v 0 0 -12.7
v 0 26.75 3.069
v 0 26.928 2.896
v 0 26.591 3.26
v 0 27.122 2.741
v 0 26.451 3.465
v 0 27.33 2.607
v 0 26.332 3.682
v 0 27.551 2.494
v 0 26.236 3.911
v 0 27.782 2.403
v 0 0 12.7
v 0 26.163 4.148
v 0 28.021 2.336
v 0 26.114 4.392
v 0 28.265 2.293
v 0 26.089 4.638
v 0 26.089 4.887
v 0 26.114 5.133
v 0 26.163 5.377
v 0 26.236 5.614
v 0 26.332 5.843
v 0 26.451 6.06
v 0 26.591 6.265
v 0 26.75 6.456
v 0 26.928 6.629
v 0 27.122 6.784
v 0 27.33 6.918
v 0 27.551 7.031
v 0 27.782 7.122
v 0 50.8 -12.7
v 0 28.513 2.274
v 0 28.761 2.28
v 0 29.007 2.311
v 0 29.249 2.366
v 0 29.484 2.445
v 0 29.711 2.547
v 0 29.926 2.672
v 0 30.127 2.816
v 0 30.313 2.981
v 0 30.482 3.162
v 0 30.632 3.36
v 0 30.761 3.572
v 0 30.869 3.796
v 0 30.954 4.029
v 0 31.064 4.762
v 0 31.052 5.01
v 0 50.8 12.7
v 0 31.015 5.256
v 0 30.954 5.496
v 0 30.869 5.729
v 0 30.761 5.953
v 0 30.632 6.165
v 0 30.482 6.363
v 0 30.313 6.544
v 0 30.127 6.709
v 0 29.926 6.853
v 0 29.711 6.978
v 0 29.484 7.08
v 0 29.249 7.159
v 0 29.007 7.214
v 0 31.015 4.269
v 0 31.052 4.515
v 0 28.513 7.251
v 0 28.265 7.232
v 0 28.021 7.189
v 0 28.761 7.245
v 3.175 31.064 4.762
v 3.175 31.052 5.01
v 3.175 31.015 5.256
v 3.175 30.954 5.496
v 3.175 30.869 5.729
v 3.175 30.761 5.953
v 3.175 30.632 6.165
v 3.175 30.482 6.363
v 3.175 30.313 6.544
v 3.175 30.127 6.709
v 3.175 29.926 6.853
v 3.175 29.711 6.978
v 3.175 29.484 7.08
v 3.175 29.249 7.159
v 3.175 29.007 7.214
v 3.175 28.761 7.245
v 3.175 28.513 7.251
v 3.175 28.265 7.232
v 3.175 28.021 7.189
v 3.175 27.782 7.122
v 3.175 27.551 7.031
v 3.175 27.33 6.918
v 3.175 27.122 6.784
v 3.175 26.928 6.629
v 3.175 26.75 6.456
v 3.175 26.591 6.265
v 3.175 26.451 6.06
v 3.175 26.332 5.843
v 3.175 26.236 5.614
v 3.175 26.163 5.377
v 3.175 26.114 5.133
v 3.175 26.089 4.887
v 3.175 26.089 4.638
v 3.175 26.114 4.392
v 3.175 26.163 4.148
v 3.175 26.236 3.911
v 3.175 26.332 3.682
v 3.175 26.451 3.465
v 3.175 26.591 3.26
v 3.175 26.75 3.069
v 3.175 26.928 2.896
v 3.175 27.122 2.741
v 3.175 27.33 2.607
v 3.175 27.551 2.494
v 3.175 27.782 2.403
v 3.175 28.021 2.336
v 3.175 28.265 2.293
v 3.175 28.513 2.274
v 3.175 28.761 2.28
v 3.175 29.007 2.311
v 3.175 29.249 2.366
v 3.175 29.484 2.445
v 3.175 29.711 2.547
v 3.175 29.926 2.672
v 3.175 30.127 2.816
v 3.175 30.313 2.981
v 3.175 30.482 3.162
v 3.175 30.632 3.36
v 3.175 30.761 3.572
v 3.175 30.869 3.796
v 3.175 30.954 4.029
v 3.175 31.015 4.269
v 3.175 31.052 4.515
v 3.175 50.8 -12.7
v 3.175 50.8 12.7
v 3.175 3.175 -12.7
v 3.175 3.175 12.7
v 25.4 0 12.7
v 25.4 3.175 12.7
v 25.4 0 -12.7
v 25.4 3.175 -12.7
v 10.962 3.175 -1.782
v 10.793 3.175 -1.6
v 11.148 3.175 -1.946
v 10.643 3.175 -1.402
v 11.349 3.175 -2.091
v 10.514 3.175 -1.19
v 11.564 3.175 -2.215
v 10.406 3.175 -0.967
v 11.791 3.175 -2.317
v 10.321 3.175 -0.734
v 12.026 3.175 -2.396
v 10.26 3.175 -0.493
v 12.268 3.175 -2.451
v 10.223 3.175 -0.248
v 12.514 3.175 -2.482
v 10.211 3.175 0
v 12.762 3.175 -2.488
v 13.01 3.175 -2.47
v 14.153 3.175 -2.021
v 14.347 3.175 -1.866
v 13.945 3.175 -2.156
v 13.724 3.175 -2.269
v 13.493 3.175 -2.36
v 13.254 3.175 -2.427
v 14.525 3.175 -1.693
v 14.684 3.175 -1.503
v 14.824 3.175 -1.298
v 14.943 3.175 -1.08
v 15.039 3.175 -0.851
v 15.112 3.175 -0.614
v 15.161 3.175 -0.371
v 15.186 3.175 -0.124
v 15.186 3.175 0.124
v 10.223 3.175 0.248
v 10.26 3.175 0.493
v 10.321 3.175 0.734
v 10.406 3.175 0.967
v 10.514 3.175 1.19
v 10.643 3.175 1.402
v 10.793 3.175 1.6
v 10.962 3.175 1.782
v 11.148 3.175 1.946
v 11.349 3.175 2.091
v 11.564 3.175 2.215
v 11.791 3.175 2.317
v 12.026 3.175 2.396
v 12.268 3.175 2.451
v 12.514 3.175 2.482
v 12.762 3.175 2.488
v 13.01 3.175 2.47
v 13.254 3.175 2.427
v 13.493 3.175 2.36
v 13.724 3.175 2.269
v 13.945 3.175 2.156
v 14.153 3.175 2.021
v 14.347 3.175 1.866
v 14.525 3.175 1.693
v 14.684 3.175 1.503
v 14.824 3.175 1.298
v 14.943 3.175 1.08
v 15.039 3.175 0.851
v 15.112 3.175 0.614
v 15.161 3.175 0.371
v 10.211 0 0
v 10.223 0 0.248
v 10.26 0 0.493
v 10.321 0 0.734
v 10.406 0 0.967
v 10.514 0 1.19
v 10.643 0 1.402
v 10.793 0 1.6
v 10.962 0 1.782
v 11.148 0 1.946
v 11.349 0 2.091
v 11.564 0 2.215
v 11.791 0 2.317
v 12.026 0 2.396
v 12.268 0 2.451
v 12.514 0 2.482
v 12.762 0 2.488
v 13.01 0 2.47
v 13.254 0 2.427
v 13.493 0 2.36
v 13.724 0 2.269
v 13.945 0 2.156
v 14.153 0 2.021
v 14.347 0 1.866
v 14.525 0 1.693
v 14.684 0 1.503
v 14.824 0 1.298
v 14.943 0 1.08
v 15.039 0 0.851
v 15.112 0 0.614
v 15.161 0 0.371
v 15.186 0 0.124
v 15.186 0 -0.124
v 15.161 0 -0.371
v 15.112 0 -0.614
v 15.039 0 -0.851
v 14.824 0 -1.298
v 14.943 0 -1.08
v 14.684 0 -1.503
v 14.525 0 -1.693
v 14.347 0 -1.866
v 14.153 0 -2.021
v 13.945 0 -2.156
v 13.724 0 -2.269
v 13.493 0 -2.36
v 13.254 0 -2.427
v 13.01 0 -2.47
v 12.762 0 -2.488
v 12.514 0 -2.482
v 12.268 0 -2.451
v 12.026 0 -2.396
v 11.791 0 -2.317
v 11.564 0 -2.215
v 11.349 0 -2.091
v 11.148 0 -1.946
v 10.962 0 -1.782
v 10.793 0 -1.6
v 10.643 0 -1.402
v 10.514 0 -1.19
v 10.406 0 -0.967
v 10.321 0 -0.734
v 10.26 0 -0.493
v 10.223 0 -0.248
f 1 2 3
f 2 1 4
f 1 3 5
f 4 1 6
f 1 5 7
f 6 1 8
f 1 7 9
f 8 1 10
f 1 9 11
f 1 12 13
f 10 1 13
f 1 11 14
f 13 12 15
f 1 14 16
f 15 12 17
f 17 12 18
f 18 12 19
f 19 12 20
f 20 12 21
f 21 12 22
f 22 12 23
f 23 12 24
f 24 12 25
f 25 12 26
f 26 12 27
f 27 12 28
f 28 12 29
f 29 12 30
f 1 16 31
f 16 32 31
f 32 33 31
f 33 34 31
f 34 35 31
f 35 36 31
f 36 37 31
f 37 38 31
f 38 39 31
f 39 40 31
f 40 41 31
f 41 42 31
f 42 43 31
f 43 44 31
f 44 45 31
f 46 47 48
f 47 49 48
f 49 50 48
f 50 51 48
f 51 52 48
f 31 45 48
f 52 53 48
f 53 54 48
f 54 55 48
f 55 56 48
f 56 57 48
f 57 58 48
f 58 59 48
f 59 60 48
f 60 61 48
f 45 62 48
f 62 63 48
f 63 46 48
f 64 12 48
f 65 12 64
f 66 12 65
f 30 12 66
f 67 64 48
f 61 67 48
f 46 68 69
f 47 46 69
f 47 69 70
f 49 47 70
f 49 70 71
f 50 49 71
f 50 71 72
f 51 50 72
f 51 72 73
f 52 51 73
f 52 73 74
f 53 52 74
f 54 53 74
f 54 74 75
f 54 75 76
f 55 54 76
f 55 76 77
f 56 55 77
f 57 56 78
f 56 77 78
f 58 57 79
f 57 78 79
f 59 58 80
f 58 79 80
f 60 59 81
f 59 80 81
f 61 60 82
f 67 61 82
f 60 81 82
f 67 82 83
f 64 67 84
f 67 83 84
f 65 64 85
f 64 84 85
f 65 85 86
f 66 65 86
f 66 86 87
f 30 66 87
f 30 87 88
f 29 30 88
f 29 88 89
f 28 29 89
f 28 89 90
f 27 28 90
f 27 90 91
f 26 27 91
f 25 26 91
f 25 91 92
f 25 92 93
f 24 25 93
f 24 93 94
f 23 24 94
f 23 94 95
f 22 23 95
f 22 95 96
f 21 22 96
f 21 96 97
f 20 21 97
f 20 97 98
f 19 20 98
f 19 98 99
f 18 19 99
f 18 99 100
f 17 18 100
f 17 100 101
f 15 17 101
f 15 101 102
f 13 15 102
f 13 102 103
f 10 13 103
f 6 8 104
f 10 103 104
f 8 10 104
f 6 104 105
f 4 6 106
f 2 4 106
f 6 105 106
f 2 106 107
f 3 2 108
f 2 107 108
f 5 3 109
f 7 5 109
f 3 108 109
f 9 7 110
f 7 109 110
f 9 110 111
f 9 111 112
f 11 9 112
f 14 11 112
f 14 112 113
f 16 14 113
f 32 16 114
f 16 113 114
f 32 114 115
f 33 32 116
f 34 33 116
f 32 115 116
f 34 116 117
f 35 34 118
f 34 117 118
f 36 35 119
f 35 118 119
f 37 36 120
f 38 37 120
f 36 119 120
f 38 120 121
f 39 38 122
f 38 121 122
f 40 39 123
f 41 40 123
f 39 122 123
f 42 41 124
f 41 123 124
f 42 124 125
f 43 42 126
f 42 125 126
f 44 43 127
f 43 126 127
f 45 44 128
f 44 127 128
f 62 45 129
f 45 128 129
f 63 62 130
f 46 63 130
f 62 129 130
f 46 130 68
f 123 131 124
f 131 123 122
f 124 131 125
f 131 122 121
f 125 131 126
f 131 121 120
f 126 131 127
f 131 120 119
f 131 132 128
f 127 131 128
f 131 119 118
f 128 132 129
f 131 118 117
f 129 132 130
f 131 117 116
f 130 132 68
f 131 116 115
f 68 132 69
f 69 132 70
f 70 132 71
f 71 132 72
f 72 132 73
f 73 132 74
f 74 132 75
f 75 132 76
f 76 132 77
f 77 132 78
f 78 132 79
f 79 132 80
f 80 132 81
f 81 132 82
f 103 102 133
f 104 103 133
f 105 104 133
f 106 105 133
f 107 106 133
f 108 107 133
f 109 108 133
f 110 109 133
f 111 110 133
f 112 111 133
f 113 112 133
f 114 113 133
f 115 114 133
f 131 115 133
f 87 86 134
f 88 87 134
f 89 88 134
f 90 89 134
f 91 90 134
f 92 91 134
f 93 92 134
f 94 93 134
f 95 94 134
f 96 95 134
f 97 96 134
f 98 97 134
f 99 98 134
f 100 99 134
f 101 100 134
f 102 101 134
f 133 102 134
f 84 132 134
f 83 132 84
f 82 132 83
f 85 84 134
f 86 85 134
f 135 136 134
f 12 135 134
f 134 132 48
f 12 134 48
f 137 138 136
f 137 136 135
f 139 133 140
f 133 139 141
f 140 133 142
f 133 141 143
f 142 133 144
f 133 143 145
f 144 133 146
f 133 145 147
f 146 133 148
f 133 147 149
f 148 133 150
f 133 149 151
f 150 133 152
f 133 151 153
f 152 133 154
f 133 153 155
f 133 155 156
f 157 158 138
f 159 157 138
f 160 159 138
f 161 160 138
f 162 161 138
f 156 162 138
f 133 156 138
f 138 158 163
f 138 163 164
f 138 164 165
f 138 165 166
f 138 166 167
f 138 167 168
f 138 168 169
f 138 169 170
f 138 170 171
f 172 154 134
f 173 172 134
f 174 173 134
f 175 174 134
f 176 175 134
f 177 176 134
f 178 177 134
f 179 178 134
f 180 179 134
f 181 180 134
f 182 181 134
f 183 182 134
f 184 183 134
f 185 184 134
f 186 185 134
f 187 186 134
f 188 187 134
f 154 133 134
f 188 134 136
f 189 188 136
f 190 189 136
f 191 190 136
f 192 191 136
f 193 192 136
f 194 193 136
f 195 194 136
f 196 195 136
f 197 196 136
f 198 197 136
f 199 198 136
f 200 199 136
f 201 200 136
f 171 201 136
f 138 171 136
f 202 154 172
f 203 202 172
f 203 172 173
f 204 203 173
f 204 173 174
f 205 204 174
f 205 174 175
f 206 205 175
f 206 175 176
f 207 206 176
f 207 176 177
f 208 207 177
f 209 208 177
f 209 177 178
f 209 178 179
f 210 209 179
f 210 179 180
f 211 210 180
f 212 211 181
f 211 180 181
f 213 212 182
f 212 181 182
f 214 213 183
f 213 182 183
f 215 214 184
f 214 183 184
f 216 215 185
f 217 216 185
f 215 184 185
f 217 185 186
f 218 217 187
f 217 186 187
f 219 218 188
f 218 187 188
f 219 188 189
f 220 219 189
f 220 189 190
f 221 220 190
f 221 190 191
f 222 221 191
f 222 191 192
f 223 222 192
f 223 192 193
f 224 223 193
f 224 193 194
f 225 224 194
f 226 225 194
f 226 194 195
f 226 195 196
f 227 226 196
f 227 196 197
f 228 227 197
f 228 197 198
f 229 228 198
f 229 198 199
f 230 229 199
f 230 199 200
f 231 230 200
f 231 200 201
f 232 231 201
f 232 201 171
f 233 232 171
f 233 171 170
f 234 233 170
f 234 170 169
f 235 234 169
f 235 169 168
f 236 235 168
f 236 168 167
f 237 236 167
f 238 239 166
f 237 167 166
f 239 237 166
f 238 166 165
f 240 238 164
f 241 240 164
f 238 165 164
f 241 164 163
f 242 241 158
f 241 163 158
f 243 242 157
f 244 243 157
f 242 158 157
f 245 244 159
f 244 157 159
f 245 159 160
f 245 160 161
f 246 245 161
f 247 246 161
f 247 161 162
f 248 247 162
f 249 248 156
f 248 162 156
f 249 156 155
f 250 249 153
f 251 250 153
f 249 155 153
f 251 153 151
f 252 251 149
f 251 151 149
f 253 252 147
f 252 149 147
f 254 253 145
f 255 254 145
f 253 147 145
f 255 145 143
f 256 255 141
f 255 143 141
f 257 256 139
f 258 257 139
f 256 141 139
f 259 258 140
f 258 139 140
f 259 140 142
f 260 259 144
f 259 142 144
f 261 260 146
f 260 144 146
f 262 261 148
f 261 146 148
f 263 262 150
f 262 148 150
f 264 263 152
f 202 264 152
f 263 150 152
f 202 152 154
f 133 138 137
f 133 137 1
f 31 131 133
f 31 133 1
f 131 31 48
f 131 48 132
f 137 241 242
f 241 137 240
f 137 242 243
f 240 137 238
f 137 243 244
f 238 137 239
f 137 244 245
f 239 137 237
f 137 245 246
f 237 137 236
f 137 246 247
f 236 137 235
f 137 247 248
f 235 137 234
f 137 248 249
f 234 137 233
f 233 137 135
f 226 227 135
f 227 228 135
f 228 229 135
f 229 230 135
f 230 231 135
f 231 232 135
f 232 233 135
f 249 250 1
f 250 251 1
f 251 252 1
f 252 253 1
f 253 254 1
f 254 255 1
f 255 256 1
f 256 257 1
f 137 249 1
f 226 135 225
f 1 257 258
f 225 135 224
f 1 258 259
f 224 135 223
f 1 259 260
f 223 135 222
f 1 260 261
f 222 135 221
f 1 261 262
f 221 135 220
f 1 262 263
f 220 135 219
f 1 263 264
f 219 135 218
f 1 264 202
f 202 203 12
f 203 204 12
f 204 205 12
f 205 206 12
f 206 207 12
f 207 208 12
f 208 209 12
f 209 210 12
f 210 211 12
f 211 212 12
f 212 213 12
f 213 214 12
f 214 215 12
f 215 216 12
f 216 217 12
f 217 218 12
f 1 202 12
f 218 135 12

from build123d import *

# Parameters (mm, degrees)
BOSS_EXTRUDE1_DEPTH = 12.7
SKETCH2_R           = 2.4892
CUT_EXTRUDE1_DEPTH  = 56.448991199
SKETCH3_R           = 2.4892
CUT_EXTRUDE2_DEPTH  = 57.884801353


with BuildPart() as part:
    # Sketch1 → Boss-Extrude1 (new, symmetric)
    with BuildSketch(Plane.XY):
        Polygon((0, 0), (0, 50.8), (3.175, 50.8), (3.175, 3.175), (25.4, 3.175), (25.4, 0), align=None)
    extrude(amount=BOSS_EXTRUDE1_DEPTH, both=True)

    # Sketch2 → Cut-Extrude1 (cut, through all)
    with BuildSketch(Plane(origin=(0, 3.175, 0), x_dir=(1, 0, 0), z_dir=(0, 1, 0))):
        with Locations(Location((12.7, 0, 0), (0, 0, 180))):
            Circle(SKETCH2_R)
    extrude(amount=-CUT_EXTRUDE1_DEPTH, mode=Mode.SUBTRACT)

    # Sketch3 → Cut-Extrude2 (cut, through all)
    with BuildSketch(Plane(origin=(3.175, 0, 0), x_dir=(0, 0, -1), z_dir=(1, 0, 0))):
        with Locations(Location((-4.7625, 28.575, 0), (0, 0, 90))):
            Circle(SKETCH3_R)
    extrude(amount=-CUT_EXTRUDE2_DEPTH, mode=Mode.SUBTRACT)


solid = part.part
